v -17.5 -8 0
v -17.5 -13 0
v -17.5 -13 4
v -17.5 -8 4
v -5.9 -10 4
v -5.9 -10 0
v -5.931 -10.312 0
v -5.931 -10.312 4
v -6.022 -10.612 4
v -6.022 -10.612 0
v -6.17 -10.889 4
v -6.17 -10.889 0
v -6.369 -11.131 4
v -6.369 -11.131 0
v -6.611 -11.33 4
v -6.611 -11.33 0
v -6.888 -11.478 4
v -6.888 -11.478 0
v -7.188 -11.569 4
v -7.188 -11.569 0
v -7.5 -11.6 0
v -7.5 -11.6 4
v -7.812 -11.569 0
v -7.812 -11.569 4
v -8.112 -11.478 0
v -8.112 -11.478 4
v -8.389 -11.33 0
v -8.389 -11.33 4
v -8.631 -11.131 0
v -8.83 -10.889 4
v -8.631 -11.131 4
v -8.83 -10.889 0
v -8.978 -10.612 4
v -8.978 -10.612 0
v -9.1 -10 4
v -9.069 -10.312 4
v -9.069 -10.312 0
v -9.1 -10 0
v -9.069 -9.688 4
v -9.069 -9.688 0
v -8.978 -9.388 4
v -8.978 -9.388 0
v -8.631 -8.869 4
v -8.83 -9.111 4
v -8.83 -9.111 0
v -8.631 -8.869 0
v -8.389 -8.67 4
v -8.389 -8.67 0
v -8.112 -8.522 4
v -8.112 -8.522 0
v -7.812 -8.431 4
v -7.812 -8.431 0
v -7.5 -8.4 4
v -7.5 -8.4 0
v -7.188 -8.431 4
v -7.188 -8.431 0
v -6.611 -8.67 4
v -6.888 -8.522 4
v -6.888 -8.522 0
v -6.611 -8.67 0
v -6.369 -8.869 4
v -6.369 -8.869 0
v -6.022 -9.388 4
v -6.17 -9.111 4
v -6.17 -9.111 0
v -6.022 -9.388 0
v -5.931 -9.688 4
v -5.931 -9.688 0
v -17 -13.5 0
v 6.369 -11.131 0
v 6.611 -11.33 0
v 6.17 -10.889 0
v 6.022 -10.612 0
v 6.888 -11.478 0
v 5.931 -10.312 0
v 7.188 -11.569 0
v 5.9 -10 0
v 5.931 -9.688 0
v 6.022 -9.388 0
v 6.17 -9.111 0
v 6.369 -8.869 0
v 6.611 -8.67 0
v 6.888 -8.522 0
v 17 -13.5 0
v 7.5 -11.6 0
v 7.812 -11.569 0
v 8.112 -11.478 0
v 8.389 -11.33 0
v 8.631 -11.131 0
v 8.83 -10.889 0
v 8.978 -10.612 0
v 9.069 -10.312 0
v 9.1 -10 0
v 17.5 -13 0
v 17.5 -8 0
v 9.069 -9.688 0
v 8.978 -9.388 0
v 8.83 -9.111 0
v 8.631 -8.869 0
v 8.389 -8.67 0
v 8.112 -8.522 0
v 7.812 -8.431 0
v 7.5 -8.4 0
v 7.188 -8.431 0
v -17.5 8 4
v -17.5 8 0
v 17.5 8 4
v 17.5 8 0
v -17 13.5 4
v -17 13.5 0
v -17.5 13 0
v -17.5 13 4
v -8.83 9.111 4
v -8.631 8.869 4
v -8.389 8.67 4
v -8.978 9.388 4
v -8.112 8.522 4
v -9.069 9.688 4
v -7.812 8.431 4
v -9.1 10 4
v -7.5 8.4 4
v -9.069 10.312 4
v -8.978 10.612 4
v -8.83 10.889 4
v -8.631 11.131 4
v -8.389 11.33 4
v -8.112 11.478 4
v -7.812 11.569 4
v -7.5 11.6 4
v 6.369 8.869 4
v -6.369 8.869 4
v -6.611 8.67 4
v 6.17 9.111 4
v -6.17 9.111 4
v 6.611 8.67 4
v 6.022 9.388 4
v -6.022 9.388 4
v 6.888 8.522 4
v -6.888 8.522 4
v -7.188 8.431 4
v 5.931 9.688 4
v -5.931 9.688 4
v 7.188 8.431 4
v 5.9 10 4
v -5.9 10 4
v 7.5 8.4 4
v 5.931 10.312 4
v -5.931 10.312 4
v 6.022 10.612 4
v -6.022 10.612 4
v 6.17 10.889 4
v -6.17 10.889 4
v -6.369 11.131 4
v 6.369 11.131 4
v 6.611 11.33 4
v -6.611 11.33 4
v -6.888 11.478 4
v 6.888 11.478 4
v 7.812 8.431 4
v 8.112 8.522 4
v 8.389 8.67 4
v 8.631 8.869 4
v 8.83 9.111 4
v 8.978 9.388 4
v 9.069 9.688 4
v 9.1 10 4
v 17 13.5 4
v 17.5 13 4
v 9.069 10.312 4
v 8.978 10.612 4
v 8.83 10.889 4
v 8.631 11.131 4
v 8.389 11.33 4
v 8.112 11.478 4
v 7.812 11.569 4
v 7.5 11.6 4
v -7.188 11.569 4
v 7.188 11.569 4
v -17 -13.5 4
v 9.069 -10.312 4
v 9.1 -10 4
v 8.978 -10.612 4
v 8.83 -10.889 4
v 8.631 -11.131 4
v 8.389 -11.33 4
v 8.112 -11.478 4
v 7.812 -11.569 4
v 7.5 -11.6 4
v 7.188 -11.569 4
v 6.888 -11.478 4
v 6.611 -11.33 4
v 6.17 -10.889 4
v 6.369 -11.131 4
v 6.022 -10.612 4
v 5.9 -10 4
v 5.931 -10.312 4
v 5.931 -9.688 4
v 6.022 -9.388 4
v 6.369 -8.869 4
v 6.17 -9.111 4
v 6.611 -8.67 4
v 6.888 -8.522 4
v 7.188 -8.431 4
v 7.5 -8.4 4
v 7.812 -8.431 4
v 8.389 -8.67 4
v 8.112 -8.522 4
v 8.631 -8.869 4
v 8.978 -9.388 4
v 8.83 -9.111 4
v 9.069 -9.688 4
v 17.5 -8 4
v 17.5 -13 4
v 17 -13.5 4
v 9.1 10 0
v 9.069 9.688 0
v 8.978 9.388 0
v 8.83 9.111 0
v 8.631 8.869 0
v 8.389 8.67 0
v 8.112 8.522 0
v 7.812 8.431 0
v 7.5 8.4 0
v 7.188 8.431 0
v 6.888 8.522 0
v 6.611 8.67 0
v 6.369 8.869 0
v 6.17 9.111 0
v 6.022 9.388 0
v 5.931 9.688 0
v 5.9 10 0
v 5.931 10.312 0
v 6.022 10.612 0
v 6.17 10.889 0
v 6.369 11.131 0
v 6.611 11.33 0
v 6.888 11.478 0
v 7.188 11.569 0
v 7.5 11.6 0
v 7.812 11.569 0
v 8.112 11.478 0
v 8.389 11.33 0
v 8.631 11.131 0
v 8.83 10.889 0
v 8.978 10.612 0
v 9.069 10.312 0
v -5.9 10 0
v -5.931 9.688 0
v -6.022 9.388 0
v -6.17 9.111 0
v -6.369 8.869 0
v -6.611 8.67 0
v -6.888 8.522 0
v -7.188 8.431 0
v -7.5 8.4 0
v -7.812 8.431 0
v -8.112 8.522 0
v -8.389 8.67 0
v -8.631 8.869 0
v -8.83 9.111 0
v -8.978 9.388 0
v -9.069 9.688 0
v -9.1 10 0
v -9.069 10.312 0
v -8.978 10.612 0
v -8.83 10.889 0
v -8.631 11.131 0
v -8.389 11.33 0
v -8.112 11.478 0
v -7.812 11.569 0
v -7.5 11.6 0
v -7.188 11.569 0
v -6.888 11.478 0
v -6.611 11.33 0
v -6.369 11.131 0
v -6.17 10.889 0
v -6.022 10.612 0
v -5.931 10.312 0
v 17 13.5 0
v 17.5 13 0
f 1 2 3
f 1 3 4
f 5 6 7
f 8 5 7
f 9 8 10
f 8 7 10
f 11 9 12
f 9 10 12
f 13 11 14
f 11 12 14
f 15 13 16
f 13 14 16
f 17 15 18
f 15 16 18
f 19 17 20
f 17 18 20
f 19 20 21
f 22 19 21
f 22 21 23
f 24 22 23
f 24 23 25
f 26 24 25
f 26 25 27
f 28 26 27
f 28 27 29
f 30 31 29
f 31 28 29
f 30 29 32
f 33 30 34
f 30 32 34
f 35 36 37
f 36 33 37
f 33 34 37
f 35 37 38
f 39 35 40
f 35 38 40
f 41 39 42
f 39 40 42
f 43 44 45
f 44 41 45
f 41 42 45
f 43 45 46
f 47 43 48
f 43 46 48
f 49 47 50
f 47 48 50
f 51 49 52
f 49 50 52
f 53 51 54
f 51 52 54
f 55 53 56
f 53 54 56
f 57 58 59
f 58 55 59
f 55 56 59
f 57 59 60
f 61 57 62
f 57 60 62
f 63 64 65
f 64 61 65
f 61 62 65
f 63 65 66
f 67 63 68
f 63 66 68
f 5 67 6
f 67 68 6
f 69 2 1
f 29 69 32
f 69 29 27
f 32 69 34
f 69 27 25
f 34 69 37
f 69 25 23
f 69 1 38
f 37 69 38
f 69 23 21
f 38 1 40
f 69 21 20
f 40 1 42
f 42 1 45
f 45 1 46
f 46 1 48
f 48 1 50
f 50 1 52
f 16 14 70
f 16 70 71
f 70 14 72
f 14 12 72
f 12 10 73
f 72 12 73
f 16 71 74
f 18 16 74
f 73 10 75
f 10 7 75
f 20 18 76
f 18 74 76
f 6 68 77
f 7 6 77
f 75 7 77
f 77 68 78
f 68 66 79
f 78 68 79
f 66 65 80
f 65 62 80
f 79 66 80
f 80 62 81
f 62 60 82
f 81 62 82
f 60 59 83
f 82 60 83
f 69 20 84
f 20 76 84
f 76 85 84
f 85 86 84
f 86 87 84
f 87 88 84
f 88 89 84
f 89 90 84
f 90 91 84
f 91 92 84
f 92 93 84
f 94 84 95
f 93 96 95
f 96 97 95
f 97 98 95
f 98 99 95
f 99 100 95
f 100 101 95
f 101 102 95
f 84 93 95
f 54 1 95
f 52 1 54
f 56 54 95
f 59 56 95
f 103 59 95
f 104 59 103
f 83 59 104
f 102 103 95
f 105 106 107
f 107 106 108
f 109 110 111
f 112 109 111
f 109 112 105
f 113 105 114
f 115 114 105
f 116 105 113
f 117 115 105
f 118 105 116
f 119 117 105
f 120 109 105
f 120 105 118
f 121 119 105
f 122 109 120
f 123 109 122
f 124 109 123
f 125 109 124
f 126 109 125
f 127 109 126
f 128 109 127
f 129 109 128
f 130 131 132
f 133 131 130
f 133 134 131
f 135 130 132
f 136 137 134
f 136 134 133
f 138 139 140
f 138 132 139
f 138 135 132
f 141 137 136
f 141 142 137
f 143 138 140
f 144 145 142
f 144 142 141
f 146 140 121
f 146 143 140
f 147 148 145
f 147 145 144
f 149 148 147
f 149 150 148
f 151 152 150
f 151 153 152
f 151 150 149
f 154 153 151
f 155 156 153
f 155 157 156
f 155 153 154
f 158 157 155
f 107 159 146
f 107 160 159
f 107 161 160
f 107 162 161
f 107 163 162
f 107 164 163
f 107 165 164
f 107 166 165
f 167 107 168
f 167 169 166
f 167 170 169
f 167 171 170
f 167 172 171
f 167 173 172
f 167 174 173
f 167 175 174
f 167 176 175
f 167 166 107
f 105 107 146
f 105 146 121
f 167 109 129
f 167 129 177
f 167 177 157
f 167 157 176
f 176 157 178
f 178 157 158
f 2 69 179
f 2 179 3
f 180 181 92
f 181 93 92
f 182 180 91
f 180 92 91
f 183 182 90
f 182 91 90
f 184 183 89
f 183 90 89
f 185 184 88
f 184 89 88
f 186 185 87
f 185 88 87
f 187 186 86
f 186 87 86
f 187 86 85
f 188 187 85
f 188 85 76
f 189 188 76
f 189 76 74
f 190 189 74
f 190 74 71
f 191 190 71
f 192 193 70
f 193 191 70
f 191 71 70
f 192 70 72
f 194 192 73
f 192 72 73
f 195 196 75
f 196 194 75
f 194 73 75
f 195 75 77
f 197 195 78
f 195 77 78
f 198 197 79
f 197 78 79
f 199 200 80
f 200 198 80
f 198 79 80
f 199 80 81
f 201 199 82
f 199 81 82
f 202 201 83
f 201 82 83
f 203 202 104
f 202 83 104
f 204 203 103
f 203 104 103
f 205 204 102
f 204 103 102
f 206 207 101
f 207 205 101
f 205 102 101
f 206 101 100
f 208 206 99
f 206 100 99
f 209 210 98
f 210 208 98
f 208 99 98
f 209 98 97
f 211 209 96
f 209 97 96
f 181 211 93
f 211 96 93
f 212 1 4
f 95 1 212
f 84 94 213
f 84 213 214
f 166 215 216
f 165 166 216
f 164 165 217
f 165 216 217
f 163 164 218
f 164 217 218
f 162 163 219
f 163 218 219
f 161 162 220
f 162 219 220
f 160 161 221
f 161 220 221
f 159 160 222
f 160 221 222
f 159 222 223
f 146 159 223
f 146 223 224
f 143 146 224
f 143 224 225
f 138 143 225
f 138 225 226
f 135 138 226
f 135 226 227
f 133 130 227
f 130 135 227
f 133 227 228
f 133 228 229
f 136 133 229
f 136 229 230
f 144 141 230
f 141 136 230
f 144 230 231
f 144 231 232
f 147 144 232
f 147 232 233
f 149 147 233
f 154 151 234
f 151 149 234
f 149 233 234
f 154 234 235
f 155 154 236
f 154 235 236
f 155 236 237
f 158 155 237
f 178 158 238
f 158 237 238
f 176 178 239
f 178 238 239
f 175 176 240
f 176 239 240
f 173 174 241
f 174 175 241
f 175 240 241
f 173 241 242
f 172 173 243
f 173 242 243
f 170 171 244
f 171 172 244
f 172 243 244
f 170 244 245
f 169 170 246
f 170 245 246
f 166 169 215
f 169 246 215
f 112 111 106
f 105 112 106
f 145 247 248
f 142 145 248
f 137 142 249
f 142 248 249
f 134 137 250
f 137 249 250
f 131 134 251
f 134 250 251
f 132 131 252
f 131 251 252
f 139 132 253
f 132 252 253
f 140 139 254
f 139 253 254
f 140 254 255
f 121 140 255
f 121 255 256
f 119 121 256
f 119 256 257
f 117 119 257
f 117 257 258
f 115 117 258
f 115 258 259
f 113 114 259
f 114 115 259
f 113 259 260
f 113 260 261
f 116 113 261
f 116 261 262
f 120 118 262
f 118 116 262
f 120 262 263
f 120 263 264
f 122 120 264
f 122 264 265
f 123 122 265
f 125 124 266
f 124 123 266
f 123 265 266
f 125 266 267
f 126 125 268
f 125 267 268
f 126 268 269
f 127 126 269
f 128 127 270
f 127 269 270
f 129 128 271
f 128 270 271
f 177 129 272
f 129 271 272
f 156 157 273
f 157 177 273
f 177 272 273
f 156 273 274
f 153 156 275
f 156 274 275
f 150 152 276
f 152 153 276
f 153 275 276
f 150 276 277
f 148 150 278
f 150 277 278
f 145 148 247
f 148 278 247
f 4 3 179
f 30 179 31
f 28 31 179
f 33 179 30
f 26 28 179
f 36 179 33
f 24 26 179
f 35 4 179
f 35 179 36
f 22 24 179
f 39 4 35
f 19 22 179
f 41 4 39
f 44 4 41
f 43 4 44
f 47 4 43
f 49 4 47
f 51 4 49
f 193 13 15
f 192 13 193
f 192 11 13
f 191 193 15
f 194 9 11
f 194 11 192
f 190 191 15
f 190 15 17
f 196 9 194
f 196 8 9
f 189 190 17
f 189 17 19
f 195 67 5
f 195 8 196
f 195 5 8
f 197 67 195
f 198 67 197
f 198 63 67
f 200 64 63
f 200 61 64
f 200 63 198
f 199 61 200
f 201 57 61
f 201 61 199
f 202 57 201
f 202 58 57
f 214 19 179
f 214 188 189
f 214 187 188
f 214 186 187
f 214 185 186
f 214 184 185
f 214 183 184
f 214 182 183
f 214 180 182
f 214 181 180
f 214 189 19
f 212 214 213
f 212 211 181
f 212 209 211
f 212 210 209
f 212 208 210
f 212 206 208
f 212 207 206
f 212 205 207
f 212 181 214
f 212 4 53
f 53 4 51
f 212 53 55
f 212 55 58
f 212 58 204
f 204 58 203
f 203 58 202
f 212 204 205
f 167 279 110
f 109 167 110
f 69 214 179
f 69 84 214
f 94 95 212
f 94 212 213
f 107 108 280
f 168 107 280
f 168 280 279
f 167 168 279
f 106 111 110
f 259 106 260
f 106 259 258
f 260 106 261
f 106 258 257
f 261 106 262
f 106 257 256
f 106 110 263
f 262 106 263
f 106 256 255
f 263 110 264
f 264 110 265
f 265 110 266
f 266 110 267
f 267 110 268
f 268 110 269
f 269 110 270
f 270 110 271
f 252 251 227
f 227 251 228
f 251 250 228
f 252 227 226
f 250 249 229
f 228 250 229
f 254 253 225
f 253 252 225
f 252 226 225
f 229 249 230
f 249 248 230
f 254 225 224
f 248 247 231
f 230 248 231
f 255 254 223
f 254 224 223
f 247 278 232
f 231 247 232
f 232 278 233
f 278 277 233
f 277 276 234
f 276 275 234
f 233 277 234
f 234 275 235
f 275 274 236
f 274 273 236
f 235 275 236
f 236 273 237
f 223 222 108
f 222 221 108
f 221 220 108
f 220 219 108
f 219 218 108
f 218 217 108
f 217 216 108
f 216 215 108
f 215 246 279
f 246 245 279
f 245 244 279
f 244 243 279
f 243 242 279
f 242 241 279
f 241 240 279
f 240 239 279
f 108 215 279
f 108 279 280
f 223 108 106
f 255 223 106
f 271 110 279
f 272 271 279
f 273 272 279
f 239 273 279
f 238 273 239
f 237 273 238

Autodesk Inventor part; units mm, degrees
ref_plane "YZ Plane" through (0, 0, 0) normal (1, 0, 0) x (0, 1, 0)
ref_plane "XZ Plane" through (0, 0, 0) normal (0, 1, 0) x (-1, 0, 0)
ref_plane "XY Plane" through (0, 0, 0) normal (0, 0, 1) x (1, 0, 0)
sketch "Sketch2" plane through (0, 0, 0) normal (0, 0, 1) x (1, 0, 0)
  circle A0 centre (-7.5, 10) radius 1.6
  circle A1 centre (7.5, 10) radius 1.6
  circle A2 centre (7.5, -10) radius 1.6
  circle A3 centre (-7.5, -10) radius 1.6
  line L0 (-17.5, 8) -> (17.5, 8)
  line L1 (17.5, 8) -> (17.5, 13)
  line L2 (17.5, 13) -> (17, 13.5)
  line L3 (17, 13.5) -> (-17, 13.5)
  line L4 (-17, 13.5) -> (-17.5, 13)
  line L5 (-17.5, 13) -> (-17.5, 8)
  line L6 (-17.5, -8) -> (17.5, -8)
  line L7 (17.5, -8) -> (17.5, -13)
  line L8 (17.5, -13) -> (17, -13.5)
  line L9 (17, -13.5) -> (-17, -13.5)
  line L10 (-17, -13.5) -> (-17.5, -13)
  line L11 (-17.5, -13) -> (-17.5, -8)
  point P0 (0, 0)
  dimension "d3" = 15
  dimension "d4" = 20
  dimension "d5" = 3.2
  dimension "d6" = 7.5
  dimension "d7" = 2
  dimension "d8" = 10
  dimension "d9" = 10
  dimension "d10" = 3.5
  dimension "d11" = 45
  dimension "d12" = 5
  dimension "d13" = 10
  dimension "d16" = 2
extrude "Extrusion1" add sketch "Sketch2" along normal blind 4
equation "\"d6\" = 0.5 * d3"
equation "\"d9\" = d8"
equation "\"d13\" = 0.5 * d4"
equation "\"d16\" = d7"
properties part number "Gantry_Baseblock" material "ABS Plastic"
